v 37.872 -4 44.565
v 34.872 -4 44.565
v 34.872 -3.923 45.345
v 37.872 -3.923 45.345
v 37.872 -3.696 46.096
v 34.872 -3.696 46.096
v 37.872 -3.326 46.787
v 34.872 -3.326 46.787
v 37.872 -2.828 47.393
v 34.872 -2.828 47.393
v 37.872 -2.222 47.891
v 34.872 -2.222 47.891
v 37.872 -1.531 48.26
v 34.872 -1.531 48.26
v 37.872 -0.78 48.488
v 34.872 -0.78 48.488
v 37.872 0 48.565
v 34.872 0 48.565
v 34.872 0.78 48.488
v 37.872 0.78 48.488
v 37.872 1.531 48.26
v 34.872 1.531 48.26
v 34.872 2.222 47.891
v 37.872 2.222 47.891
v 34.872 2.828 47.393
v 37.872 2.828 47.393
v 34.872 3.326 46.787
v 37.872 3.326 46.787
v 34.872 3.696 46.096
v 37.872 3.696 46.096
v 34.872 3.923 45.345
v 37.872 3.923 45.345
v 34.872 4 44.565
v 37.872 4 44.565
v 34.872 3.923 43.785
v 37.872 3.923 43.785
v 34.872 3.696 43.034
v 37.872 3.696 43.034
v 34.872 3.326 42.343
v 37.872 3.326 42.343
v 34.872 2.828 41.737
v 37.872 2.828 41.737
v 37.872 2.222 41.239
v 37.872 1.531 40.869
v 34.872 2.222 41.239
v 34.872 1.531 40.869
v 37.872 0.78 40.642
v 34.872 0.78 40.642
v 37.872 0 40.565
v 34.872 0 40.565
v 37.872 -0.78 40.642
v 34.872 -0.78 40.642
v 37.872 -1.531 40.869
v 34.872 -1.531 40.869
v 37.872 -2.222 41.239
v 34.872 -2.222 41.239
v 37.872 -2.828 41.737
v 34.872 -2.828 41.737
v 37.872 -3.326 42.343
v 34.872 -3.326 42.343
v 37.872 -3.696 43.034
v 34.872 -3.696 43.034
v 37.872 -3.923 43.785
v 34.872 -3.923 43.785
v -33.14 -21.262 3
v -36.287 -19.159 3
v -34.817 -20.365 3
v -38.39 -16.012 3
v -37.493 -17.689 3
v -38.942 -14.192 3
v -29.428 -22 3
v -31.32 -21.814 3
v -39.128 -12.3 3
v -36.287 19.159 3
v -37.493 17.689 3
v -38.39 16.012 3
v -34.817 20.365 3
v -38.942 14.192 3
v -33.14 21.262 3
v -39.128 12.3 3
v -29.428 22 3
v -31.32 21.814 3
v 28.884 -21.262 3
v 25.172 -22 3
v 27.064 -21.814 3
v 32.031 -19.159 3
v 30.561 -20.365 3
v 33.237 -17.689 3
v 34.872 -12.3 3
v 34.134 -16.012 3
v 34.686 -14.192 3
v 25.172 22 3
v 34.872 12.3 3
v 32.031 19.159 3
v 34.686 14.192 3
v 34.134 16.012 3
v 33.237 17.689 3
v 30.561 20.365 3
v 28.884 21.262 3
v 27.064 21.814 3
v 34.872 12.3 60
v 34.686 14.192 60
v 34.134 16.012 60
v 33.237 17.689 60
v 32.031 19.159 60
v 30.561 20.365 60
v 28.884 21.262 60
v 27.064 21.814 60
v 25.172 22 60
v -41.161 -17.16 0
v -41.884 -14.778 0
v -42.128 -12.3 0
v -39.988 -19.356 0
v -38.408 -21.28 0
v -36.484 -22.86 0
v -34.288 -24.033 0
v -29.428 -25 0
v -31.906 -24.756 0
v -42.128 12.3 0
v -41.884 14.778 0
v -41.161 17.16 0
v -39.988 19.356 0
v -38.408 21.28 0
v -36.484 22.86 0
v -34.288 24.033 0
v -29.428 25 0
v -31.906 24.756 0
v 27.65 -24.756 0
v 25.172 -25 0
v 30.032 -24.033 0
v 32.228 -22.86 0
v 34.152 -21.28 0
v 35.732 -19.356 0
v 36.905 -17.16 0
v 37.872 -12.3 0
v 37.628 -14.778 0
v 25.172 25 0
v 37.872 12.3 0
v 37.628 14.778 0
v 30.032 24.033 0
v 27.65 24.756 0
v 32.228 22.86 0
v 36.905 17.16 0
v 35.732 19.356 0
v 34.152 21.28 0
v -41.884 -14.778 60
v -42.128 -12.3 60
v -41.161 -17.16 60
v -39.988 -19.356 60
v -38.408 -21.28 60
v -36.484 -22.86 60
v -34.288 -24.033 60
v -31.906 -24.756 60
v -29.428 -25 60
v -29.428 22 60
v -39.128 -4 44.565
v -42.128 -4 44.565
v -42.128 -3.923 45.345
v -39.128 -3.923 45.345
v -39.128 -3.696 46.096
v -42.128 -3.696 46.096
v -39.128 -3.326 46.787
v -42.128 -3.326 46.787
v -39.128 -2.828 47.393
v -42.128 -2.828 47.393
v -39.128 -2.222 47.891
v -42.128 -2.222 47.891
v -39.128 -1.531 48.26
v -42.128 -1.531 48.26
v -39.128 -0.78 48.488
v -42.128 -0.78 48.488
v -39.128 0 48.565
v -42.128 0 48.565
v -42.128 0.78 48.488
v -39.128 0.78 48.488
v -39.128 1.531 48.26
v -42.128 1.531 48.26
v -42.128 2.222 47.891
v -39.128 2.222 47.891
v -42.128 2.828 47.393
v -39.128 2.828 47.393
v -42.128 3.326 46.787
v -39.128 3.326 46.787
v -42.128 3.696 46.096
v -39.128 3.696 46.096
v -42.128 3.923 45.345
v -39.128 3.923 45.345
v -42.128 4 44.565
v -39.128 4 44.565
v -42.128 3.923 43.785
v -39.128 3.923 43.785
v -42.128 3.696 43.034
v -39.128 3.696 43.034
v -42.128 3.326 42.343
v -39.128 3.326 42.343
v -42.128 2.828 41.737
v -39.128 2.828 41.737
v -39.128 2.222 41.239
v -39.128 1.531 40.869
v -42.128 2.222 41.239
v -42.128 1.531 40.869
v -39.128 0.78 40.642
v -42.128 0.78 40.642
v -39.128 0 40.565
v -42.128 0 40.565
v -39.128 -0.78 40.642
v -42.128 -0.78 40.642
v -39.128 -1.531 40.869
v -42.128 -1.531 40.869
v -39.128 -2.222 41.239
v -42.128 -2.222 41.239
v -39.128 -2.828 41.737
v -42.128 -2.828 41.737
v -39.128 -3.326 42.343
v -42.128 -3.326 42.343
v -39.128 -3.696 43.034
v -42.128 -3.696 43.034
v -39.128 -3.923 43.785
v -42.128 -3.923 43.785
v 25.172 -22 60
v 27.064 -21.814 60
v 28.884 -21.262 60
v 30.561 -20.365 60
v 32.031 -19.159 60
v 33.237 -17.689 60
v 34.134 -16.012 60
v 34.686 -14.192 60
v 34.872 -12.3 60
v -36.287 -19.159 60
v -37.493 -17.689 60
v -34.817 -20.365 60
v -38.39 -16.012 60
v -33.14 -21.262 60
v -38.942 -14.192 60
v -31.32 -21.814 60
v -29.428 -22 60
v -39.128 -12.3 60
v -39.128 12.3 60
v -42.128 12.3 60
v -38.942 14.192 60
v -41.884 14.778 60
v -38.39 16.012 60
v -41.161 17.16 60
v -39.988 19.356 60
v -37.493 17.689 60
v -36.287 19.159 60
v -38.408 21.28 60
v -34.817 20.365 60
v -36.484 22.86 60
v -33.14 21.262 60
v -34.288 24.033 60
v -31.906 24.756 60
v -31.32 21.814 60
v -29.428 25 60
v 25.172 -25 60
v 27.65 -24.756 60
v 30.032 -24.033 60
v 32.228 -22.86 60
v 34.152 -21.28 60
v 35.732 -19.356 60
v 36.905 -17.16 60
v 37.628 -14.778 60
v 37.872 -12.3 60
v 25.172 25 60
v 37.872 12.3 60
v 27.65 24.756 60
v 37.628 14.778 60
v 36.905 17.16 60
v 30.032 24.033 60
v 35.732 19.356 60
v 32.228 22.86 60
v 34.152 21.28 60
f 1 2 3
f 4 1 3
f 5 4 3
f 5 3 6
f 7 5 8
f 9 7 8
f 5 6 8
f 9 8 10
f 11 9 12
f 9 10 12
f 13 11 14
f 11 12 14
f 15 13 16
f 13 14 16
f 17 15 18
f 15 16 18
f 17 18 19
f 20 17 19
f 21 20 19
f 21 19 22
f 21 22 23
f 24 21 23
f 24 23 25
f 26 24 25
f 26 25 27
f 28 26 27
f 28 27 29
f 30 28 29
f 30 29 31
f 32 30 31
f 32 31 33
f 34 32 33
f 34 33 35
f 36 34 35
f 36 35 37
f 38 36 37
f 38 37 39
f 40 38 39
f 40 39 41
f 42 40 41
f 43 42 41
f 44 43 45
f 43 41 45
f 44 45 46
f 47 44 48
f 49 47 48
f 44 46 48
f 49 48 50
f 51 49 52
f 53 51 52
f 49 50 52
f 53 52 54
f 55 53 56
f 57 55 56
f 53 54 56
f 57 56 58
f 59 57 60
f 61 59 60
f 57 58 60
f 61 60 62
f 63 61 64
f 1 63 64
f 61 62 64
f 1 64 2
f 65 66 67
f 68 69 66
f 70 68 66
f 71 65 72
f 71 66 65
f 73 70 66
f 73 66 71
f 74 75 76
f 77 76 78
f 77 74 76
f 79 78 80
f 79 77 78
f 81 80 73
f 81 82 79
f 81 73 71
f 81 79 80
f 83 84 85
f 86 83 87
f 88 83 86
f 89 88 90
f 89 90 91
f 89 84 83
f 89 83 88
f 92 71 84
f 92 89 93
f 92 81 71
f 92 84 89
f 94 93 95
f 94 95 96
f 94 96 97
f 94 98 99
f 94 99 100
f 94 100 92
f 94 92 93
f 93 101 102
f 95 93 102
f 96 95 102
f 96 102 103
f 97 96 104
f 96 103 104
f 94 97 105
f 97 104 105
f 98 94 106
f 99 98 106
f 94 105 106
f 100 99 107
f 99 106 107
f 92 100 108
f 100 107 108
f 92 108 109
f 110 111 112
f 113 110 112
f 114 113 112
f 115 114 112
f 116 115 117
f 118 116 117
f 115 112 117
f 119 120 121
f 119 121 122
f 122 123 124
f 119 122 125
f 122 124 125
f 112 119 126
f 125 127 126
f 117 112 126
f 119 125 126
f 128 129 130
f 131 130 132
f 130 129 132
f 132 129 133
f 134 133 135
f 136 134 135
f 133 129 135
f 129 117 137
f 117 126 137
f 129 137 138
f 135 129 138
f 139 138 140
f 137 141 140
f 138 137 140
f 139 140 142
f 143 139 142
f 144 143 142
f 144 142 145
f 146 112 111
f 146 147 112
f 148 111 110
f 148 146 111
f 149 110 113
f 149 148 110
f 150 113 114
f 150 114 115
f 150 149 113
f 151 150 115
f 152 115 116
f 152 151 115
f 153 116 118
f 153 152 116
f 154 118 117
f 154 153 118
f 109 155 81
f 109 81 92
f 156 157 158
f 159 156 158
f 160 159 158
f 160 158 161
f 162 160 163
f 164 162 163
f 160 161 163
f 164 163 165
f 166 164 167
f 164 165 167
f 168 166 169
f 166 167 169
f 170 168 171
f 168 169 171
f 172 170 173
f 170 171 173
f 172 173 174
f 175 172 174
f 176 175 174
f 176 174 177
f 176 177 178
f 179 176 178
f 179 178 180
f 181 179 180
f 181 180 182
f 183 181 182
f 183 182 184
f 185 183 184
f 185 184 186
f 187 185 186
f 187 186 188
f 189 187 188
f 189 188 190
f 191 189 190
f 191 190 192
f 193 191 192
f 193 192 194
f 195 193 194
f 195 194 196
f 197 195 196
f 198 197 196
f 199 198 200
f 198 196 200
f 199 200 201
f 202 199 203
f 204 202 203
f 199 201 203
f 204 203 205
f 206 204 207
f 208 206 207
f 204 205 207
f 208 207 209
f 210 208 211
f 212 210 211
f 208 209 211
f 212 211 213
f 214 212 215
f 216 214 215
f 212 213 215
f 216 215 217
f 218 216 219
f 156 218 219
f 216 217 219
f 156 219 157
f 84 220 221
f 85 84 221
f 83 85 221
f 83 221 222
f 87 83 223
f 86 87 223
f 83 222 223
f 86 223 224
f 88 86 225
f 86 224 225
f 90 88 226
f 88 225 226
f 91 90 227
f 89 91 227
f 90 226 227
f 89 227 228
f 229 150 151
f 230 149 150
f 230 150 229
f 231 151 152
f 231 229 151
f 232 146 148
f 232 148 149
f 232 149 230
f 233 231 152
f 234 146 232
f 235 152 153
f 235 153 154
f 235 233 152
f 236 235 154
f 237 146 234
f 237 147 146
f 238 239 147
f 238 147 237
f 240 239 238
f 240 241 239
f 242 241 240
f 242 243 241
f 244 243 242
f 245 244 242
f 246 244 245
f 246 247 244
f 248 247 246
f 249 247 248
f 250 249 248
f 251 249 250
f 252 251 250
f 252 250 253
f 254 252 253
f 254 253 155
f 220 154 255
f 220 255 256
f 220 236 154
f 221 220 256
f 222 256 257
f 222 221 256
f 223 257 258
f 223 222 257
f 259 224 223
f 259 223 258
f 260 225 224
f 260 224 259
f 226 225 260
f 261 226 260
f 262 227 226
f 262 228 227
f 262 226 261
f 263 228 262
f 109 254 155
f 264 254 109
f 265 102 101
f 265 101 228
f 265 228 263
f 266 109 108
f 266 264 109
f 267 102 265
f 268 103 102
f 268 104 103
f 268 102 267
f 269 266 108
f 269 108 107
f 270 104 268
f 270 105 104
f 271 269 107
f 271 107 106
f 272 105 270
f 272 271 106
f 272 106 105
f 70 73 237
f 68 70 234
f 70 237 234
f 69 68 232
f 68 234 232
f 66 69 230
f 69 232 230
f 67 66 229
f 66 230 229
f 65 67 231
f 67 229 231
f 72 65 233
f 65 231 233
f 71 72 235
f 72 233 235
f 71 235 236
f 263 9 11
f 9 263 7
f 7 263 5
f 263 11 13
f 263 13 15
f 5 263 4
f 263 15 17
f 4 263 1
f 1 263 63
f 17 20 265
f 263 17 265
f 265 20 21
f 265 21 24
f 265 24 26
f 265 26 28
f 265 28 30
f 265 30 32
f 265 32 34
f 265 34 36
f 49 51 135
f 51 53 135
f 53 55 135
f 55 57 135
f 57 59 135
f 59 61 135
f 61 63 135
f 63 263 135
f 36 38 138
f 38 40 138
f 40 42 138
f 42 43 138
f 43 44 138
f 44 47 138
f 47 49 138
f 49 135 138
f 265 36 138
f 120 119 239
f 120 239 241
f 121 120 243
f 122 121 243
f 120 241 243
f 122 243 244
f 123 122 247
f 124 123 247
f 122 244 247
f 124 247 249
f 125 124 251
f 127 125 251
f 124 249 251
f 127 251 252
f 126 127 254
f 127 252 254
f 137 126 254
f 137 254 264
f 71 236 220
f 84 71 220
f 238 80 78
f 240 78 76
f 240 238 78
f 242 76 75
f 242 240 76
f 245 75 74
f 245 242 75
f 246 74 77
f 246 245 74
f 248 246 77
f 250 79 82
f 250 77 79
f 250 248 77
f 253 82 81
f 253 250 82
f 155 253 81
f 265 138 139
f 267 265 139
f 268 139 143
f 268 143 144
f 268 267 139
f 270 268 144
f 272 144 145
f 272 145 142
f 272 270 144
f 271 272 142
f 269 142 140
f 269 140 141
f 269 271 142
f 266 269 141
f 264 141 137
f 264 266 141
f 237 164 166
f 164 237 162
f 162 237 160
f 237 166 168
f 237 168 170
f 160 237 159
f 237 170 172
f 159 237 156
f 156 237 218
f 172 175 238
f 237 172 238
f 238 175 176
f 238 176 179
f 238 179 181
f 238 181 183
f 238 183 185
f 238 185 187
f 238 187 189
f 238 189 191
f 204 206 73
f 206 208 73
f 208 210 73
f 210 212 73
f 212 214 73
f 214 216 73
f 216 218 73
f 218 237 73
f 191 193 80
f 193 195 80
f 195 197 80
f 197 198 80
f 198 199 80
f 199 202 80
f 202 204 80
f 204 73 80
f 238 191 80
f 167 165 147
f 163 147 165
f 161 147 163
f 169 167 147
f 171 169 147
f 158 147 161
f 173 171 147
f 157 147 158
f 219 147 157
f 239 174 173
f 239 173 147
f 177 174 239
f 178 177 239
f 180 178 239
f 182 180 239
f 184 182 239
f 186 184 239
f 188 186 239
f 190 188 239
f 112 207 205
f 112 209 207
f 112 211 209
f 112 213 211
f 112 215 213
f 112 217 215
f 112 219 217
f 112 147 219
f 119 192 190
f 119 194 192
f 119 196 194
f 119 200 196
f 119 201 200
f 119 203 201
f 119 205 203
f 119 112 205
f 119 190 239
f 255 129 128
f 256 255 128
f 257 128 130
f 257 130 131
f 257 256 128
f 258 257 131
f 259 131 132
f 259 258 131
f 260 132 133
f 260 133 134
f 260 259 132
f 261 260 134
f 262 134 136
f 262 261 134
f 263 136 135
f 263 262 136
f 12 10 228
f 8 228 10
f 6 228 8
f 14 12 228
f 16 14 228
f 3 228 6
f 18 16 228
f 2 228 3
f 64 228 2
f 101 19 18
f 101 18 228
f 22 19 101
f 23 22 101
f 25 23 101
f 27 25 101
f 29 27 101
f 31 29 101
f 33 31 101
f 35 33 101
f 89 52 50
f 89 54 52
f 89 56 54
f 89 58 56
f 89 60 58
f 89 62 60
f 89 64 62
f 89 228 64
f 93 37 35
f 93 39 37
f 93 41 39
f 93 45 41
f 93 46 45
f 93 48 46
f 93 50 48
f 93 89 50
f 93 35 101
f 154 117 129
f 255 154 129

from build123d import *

# Parameters (mm, degrees)
F0_W     = 80
F0_H     = 50
F1_DEPTH = 60
F2_R     = 12.7
F3_T     = -3
F5_D     = 8


# Not quite as in the source:
# - a feature names something its author has since deleted; it is built from what else it names


with BuildPart() as f1:
    # F0 (on Top) → F1 (new body)
    with BuildSketch(Plane.XY):
        with Locations((-2.1280694621, 0)):
            Rectangle(F0_W, F0_H)
    extrude(amount=F1_DEPTH)

    # F2
    f2_edges = [f1.edges().sort_by_distance(p)[0] for p in [
        (-42.128069, -25, 30),
        (37.871931, 25, 30),
        (37.871931, -25, 30),
        (-42.128069, 25, 30),
    ]]
    fillet(f2_edges, radius=F2_R)

    # F3
    f3_openings = [f1.faces().sort_by_distance(p)[0] for p in [
        (-2.128069, 0, 60),
    ]]
    offset(amount=F3_T, openings=f3_openings)

    # F5 (through all)
    with Locations(Plane.YZ.offset(37.8719305379)):
        with Locations((0, 44.5649288595)):
            Hole(F5_D / 2)


solid = f1.part
